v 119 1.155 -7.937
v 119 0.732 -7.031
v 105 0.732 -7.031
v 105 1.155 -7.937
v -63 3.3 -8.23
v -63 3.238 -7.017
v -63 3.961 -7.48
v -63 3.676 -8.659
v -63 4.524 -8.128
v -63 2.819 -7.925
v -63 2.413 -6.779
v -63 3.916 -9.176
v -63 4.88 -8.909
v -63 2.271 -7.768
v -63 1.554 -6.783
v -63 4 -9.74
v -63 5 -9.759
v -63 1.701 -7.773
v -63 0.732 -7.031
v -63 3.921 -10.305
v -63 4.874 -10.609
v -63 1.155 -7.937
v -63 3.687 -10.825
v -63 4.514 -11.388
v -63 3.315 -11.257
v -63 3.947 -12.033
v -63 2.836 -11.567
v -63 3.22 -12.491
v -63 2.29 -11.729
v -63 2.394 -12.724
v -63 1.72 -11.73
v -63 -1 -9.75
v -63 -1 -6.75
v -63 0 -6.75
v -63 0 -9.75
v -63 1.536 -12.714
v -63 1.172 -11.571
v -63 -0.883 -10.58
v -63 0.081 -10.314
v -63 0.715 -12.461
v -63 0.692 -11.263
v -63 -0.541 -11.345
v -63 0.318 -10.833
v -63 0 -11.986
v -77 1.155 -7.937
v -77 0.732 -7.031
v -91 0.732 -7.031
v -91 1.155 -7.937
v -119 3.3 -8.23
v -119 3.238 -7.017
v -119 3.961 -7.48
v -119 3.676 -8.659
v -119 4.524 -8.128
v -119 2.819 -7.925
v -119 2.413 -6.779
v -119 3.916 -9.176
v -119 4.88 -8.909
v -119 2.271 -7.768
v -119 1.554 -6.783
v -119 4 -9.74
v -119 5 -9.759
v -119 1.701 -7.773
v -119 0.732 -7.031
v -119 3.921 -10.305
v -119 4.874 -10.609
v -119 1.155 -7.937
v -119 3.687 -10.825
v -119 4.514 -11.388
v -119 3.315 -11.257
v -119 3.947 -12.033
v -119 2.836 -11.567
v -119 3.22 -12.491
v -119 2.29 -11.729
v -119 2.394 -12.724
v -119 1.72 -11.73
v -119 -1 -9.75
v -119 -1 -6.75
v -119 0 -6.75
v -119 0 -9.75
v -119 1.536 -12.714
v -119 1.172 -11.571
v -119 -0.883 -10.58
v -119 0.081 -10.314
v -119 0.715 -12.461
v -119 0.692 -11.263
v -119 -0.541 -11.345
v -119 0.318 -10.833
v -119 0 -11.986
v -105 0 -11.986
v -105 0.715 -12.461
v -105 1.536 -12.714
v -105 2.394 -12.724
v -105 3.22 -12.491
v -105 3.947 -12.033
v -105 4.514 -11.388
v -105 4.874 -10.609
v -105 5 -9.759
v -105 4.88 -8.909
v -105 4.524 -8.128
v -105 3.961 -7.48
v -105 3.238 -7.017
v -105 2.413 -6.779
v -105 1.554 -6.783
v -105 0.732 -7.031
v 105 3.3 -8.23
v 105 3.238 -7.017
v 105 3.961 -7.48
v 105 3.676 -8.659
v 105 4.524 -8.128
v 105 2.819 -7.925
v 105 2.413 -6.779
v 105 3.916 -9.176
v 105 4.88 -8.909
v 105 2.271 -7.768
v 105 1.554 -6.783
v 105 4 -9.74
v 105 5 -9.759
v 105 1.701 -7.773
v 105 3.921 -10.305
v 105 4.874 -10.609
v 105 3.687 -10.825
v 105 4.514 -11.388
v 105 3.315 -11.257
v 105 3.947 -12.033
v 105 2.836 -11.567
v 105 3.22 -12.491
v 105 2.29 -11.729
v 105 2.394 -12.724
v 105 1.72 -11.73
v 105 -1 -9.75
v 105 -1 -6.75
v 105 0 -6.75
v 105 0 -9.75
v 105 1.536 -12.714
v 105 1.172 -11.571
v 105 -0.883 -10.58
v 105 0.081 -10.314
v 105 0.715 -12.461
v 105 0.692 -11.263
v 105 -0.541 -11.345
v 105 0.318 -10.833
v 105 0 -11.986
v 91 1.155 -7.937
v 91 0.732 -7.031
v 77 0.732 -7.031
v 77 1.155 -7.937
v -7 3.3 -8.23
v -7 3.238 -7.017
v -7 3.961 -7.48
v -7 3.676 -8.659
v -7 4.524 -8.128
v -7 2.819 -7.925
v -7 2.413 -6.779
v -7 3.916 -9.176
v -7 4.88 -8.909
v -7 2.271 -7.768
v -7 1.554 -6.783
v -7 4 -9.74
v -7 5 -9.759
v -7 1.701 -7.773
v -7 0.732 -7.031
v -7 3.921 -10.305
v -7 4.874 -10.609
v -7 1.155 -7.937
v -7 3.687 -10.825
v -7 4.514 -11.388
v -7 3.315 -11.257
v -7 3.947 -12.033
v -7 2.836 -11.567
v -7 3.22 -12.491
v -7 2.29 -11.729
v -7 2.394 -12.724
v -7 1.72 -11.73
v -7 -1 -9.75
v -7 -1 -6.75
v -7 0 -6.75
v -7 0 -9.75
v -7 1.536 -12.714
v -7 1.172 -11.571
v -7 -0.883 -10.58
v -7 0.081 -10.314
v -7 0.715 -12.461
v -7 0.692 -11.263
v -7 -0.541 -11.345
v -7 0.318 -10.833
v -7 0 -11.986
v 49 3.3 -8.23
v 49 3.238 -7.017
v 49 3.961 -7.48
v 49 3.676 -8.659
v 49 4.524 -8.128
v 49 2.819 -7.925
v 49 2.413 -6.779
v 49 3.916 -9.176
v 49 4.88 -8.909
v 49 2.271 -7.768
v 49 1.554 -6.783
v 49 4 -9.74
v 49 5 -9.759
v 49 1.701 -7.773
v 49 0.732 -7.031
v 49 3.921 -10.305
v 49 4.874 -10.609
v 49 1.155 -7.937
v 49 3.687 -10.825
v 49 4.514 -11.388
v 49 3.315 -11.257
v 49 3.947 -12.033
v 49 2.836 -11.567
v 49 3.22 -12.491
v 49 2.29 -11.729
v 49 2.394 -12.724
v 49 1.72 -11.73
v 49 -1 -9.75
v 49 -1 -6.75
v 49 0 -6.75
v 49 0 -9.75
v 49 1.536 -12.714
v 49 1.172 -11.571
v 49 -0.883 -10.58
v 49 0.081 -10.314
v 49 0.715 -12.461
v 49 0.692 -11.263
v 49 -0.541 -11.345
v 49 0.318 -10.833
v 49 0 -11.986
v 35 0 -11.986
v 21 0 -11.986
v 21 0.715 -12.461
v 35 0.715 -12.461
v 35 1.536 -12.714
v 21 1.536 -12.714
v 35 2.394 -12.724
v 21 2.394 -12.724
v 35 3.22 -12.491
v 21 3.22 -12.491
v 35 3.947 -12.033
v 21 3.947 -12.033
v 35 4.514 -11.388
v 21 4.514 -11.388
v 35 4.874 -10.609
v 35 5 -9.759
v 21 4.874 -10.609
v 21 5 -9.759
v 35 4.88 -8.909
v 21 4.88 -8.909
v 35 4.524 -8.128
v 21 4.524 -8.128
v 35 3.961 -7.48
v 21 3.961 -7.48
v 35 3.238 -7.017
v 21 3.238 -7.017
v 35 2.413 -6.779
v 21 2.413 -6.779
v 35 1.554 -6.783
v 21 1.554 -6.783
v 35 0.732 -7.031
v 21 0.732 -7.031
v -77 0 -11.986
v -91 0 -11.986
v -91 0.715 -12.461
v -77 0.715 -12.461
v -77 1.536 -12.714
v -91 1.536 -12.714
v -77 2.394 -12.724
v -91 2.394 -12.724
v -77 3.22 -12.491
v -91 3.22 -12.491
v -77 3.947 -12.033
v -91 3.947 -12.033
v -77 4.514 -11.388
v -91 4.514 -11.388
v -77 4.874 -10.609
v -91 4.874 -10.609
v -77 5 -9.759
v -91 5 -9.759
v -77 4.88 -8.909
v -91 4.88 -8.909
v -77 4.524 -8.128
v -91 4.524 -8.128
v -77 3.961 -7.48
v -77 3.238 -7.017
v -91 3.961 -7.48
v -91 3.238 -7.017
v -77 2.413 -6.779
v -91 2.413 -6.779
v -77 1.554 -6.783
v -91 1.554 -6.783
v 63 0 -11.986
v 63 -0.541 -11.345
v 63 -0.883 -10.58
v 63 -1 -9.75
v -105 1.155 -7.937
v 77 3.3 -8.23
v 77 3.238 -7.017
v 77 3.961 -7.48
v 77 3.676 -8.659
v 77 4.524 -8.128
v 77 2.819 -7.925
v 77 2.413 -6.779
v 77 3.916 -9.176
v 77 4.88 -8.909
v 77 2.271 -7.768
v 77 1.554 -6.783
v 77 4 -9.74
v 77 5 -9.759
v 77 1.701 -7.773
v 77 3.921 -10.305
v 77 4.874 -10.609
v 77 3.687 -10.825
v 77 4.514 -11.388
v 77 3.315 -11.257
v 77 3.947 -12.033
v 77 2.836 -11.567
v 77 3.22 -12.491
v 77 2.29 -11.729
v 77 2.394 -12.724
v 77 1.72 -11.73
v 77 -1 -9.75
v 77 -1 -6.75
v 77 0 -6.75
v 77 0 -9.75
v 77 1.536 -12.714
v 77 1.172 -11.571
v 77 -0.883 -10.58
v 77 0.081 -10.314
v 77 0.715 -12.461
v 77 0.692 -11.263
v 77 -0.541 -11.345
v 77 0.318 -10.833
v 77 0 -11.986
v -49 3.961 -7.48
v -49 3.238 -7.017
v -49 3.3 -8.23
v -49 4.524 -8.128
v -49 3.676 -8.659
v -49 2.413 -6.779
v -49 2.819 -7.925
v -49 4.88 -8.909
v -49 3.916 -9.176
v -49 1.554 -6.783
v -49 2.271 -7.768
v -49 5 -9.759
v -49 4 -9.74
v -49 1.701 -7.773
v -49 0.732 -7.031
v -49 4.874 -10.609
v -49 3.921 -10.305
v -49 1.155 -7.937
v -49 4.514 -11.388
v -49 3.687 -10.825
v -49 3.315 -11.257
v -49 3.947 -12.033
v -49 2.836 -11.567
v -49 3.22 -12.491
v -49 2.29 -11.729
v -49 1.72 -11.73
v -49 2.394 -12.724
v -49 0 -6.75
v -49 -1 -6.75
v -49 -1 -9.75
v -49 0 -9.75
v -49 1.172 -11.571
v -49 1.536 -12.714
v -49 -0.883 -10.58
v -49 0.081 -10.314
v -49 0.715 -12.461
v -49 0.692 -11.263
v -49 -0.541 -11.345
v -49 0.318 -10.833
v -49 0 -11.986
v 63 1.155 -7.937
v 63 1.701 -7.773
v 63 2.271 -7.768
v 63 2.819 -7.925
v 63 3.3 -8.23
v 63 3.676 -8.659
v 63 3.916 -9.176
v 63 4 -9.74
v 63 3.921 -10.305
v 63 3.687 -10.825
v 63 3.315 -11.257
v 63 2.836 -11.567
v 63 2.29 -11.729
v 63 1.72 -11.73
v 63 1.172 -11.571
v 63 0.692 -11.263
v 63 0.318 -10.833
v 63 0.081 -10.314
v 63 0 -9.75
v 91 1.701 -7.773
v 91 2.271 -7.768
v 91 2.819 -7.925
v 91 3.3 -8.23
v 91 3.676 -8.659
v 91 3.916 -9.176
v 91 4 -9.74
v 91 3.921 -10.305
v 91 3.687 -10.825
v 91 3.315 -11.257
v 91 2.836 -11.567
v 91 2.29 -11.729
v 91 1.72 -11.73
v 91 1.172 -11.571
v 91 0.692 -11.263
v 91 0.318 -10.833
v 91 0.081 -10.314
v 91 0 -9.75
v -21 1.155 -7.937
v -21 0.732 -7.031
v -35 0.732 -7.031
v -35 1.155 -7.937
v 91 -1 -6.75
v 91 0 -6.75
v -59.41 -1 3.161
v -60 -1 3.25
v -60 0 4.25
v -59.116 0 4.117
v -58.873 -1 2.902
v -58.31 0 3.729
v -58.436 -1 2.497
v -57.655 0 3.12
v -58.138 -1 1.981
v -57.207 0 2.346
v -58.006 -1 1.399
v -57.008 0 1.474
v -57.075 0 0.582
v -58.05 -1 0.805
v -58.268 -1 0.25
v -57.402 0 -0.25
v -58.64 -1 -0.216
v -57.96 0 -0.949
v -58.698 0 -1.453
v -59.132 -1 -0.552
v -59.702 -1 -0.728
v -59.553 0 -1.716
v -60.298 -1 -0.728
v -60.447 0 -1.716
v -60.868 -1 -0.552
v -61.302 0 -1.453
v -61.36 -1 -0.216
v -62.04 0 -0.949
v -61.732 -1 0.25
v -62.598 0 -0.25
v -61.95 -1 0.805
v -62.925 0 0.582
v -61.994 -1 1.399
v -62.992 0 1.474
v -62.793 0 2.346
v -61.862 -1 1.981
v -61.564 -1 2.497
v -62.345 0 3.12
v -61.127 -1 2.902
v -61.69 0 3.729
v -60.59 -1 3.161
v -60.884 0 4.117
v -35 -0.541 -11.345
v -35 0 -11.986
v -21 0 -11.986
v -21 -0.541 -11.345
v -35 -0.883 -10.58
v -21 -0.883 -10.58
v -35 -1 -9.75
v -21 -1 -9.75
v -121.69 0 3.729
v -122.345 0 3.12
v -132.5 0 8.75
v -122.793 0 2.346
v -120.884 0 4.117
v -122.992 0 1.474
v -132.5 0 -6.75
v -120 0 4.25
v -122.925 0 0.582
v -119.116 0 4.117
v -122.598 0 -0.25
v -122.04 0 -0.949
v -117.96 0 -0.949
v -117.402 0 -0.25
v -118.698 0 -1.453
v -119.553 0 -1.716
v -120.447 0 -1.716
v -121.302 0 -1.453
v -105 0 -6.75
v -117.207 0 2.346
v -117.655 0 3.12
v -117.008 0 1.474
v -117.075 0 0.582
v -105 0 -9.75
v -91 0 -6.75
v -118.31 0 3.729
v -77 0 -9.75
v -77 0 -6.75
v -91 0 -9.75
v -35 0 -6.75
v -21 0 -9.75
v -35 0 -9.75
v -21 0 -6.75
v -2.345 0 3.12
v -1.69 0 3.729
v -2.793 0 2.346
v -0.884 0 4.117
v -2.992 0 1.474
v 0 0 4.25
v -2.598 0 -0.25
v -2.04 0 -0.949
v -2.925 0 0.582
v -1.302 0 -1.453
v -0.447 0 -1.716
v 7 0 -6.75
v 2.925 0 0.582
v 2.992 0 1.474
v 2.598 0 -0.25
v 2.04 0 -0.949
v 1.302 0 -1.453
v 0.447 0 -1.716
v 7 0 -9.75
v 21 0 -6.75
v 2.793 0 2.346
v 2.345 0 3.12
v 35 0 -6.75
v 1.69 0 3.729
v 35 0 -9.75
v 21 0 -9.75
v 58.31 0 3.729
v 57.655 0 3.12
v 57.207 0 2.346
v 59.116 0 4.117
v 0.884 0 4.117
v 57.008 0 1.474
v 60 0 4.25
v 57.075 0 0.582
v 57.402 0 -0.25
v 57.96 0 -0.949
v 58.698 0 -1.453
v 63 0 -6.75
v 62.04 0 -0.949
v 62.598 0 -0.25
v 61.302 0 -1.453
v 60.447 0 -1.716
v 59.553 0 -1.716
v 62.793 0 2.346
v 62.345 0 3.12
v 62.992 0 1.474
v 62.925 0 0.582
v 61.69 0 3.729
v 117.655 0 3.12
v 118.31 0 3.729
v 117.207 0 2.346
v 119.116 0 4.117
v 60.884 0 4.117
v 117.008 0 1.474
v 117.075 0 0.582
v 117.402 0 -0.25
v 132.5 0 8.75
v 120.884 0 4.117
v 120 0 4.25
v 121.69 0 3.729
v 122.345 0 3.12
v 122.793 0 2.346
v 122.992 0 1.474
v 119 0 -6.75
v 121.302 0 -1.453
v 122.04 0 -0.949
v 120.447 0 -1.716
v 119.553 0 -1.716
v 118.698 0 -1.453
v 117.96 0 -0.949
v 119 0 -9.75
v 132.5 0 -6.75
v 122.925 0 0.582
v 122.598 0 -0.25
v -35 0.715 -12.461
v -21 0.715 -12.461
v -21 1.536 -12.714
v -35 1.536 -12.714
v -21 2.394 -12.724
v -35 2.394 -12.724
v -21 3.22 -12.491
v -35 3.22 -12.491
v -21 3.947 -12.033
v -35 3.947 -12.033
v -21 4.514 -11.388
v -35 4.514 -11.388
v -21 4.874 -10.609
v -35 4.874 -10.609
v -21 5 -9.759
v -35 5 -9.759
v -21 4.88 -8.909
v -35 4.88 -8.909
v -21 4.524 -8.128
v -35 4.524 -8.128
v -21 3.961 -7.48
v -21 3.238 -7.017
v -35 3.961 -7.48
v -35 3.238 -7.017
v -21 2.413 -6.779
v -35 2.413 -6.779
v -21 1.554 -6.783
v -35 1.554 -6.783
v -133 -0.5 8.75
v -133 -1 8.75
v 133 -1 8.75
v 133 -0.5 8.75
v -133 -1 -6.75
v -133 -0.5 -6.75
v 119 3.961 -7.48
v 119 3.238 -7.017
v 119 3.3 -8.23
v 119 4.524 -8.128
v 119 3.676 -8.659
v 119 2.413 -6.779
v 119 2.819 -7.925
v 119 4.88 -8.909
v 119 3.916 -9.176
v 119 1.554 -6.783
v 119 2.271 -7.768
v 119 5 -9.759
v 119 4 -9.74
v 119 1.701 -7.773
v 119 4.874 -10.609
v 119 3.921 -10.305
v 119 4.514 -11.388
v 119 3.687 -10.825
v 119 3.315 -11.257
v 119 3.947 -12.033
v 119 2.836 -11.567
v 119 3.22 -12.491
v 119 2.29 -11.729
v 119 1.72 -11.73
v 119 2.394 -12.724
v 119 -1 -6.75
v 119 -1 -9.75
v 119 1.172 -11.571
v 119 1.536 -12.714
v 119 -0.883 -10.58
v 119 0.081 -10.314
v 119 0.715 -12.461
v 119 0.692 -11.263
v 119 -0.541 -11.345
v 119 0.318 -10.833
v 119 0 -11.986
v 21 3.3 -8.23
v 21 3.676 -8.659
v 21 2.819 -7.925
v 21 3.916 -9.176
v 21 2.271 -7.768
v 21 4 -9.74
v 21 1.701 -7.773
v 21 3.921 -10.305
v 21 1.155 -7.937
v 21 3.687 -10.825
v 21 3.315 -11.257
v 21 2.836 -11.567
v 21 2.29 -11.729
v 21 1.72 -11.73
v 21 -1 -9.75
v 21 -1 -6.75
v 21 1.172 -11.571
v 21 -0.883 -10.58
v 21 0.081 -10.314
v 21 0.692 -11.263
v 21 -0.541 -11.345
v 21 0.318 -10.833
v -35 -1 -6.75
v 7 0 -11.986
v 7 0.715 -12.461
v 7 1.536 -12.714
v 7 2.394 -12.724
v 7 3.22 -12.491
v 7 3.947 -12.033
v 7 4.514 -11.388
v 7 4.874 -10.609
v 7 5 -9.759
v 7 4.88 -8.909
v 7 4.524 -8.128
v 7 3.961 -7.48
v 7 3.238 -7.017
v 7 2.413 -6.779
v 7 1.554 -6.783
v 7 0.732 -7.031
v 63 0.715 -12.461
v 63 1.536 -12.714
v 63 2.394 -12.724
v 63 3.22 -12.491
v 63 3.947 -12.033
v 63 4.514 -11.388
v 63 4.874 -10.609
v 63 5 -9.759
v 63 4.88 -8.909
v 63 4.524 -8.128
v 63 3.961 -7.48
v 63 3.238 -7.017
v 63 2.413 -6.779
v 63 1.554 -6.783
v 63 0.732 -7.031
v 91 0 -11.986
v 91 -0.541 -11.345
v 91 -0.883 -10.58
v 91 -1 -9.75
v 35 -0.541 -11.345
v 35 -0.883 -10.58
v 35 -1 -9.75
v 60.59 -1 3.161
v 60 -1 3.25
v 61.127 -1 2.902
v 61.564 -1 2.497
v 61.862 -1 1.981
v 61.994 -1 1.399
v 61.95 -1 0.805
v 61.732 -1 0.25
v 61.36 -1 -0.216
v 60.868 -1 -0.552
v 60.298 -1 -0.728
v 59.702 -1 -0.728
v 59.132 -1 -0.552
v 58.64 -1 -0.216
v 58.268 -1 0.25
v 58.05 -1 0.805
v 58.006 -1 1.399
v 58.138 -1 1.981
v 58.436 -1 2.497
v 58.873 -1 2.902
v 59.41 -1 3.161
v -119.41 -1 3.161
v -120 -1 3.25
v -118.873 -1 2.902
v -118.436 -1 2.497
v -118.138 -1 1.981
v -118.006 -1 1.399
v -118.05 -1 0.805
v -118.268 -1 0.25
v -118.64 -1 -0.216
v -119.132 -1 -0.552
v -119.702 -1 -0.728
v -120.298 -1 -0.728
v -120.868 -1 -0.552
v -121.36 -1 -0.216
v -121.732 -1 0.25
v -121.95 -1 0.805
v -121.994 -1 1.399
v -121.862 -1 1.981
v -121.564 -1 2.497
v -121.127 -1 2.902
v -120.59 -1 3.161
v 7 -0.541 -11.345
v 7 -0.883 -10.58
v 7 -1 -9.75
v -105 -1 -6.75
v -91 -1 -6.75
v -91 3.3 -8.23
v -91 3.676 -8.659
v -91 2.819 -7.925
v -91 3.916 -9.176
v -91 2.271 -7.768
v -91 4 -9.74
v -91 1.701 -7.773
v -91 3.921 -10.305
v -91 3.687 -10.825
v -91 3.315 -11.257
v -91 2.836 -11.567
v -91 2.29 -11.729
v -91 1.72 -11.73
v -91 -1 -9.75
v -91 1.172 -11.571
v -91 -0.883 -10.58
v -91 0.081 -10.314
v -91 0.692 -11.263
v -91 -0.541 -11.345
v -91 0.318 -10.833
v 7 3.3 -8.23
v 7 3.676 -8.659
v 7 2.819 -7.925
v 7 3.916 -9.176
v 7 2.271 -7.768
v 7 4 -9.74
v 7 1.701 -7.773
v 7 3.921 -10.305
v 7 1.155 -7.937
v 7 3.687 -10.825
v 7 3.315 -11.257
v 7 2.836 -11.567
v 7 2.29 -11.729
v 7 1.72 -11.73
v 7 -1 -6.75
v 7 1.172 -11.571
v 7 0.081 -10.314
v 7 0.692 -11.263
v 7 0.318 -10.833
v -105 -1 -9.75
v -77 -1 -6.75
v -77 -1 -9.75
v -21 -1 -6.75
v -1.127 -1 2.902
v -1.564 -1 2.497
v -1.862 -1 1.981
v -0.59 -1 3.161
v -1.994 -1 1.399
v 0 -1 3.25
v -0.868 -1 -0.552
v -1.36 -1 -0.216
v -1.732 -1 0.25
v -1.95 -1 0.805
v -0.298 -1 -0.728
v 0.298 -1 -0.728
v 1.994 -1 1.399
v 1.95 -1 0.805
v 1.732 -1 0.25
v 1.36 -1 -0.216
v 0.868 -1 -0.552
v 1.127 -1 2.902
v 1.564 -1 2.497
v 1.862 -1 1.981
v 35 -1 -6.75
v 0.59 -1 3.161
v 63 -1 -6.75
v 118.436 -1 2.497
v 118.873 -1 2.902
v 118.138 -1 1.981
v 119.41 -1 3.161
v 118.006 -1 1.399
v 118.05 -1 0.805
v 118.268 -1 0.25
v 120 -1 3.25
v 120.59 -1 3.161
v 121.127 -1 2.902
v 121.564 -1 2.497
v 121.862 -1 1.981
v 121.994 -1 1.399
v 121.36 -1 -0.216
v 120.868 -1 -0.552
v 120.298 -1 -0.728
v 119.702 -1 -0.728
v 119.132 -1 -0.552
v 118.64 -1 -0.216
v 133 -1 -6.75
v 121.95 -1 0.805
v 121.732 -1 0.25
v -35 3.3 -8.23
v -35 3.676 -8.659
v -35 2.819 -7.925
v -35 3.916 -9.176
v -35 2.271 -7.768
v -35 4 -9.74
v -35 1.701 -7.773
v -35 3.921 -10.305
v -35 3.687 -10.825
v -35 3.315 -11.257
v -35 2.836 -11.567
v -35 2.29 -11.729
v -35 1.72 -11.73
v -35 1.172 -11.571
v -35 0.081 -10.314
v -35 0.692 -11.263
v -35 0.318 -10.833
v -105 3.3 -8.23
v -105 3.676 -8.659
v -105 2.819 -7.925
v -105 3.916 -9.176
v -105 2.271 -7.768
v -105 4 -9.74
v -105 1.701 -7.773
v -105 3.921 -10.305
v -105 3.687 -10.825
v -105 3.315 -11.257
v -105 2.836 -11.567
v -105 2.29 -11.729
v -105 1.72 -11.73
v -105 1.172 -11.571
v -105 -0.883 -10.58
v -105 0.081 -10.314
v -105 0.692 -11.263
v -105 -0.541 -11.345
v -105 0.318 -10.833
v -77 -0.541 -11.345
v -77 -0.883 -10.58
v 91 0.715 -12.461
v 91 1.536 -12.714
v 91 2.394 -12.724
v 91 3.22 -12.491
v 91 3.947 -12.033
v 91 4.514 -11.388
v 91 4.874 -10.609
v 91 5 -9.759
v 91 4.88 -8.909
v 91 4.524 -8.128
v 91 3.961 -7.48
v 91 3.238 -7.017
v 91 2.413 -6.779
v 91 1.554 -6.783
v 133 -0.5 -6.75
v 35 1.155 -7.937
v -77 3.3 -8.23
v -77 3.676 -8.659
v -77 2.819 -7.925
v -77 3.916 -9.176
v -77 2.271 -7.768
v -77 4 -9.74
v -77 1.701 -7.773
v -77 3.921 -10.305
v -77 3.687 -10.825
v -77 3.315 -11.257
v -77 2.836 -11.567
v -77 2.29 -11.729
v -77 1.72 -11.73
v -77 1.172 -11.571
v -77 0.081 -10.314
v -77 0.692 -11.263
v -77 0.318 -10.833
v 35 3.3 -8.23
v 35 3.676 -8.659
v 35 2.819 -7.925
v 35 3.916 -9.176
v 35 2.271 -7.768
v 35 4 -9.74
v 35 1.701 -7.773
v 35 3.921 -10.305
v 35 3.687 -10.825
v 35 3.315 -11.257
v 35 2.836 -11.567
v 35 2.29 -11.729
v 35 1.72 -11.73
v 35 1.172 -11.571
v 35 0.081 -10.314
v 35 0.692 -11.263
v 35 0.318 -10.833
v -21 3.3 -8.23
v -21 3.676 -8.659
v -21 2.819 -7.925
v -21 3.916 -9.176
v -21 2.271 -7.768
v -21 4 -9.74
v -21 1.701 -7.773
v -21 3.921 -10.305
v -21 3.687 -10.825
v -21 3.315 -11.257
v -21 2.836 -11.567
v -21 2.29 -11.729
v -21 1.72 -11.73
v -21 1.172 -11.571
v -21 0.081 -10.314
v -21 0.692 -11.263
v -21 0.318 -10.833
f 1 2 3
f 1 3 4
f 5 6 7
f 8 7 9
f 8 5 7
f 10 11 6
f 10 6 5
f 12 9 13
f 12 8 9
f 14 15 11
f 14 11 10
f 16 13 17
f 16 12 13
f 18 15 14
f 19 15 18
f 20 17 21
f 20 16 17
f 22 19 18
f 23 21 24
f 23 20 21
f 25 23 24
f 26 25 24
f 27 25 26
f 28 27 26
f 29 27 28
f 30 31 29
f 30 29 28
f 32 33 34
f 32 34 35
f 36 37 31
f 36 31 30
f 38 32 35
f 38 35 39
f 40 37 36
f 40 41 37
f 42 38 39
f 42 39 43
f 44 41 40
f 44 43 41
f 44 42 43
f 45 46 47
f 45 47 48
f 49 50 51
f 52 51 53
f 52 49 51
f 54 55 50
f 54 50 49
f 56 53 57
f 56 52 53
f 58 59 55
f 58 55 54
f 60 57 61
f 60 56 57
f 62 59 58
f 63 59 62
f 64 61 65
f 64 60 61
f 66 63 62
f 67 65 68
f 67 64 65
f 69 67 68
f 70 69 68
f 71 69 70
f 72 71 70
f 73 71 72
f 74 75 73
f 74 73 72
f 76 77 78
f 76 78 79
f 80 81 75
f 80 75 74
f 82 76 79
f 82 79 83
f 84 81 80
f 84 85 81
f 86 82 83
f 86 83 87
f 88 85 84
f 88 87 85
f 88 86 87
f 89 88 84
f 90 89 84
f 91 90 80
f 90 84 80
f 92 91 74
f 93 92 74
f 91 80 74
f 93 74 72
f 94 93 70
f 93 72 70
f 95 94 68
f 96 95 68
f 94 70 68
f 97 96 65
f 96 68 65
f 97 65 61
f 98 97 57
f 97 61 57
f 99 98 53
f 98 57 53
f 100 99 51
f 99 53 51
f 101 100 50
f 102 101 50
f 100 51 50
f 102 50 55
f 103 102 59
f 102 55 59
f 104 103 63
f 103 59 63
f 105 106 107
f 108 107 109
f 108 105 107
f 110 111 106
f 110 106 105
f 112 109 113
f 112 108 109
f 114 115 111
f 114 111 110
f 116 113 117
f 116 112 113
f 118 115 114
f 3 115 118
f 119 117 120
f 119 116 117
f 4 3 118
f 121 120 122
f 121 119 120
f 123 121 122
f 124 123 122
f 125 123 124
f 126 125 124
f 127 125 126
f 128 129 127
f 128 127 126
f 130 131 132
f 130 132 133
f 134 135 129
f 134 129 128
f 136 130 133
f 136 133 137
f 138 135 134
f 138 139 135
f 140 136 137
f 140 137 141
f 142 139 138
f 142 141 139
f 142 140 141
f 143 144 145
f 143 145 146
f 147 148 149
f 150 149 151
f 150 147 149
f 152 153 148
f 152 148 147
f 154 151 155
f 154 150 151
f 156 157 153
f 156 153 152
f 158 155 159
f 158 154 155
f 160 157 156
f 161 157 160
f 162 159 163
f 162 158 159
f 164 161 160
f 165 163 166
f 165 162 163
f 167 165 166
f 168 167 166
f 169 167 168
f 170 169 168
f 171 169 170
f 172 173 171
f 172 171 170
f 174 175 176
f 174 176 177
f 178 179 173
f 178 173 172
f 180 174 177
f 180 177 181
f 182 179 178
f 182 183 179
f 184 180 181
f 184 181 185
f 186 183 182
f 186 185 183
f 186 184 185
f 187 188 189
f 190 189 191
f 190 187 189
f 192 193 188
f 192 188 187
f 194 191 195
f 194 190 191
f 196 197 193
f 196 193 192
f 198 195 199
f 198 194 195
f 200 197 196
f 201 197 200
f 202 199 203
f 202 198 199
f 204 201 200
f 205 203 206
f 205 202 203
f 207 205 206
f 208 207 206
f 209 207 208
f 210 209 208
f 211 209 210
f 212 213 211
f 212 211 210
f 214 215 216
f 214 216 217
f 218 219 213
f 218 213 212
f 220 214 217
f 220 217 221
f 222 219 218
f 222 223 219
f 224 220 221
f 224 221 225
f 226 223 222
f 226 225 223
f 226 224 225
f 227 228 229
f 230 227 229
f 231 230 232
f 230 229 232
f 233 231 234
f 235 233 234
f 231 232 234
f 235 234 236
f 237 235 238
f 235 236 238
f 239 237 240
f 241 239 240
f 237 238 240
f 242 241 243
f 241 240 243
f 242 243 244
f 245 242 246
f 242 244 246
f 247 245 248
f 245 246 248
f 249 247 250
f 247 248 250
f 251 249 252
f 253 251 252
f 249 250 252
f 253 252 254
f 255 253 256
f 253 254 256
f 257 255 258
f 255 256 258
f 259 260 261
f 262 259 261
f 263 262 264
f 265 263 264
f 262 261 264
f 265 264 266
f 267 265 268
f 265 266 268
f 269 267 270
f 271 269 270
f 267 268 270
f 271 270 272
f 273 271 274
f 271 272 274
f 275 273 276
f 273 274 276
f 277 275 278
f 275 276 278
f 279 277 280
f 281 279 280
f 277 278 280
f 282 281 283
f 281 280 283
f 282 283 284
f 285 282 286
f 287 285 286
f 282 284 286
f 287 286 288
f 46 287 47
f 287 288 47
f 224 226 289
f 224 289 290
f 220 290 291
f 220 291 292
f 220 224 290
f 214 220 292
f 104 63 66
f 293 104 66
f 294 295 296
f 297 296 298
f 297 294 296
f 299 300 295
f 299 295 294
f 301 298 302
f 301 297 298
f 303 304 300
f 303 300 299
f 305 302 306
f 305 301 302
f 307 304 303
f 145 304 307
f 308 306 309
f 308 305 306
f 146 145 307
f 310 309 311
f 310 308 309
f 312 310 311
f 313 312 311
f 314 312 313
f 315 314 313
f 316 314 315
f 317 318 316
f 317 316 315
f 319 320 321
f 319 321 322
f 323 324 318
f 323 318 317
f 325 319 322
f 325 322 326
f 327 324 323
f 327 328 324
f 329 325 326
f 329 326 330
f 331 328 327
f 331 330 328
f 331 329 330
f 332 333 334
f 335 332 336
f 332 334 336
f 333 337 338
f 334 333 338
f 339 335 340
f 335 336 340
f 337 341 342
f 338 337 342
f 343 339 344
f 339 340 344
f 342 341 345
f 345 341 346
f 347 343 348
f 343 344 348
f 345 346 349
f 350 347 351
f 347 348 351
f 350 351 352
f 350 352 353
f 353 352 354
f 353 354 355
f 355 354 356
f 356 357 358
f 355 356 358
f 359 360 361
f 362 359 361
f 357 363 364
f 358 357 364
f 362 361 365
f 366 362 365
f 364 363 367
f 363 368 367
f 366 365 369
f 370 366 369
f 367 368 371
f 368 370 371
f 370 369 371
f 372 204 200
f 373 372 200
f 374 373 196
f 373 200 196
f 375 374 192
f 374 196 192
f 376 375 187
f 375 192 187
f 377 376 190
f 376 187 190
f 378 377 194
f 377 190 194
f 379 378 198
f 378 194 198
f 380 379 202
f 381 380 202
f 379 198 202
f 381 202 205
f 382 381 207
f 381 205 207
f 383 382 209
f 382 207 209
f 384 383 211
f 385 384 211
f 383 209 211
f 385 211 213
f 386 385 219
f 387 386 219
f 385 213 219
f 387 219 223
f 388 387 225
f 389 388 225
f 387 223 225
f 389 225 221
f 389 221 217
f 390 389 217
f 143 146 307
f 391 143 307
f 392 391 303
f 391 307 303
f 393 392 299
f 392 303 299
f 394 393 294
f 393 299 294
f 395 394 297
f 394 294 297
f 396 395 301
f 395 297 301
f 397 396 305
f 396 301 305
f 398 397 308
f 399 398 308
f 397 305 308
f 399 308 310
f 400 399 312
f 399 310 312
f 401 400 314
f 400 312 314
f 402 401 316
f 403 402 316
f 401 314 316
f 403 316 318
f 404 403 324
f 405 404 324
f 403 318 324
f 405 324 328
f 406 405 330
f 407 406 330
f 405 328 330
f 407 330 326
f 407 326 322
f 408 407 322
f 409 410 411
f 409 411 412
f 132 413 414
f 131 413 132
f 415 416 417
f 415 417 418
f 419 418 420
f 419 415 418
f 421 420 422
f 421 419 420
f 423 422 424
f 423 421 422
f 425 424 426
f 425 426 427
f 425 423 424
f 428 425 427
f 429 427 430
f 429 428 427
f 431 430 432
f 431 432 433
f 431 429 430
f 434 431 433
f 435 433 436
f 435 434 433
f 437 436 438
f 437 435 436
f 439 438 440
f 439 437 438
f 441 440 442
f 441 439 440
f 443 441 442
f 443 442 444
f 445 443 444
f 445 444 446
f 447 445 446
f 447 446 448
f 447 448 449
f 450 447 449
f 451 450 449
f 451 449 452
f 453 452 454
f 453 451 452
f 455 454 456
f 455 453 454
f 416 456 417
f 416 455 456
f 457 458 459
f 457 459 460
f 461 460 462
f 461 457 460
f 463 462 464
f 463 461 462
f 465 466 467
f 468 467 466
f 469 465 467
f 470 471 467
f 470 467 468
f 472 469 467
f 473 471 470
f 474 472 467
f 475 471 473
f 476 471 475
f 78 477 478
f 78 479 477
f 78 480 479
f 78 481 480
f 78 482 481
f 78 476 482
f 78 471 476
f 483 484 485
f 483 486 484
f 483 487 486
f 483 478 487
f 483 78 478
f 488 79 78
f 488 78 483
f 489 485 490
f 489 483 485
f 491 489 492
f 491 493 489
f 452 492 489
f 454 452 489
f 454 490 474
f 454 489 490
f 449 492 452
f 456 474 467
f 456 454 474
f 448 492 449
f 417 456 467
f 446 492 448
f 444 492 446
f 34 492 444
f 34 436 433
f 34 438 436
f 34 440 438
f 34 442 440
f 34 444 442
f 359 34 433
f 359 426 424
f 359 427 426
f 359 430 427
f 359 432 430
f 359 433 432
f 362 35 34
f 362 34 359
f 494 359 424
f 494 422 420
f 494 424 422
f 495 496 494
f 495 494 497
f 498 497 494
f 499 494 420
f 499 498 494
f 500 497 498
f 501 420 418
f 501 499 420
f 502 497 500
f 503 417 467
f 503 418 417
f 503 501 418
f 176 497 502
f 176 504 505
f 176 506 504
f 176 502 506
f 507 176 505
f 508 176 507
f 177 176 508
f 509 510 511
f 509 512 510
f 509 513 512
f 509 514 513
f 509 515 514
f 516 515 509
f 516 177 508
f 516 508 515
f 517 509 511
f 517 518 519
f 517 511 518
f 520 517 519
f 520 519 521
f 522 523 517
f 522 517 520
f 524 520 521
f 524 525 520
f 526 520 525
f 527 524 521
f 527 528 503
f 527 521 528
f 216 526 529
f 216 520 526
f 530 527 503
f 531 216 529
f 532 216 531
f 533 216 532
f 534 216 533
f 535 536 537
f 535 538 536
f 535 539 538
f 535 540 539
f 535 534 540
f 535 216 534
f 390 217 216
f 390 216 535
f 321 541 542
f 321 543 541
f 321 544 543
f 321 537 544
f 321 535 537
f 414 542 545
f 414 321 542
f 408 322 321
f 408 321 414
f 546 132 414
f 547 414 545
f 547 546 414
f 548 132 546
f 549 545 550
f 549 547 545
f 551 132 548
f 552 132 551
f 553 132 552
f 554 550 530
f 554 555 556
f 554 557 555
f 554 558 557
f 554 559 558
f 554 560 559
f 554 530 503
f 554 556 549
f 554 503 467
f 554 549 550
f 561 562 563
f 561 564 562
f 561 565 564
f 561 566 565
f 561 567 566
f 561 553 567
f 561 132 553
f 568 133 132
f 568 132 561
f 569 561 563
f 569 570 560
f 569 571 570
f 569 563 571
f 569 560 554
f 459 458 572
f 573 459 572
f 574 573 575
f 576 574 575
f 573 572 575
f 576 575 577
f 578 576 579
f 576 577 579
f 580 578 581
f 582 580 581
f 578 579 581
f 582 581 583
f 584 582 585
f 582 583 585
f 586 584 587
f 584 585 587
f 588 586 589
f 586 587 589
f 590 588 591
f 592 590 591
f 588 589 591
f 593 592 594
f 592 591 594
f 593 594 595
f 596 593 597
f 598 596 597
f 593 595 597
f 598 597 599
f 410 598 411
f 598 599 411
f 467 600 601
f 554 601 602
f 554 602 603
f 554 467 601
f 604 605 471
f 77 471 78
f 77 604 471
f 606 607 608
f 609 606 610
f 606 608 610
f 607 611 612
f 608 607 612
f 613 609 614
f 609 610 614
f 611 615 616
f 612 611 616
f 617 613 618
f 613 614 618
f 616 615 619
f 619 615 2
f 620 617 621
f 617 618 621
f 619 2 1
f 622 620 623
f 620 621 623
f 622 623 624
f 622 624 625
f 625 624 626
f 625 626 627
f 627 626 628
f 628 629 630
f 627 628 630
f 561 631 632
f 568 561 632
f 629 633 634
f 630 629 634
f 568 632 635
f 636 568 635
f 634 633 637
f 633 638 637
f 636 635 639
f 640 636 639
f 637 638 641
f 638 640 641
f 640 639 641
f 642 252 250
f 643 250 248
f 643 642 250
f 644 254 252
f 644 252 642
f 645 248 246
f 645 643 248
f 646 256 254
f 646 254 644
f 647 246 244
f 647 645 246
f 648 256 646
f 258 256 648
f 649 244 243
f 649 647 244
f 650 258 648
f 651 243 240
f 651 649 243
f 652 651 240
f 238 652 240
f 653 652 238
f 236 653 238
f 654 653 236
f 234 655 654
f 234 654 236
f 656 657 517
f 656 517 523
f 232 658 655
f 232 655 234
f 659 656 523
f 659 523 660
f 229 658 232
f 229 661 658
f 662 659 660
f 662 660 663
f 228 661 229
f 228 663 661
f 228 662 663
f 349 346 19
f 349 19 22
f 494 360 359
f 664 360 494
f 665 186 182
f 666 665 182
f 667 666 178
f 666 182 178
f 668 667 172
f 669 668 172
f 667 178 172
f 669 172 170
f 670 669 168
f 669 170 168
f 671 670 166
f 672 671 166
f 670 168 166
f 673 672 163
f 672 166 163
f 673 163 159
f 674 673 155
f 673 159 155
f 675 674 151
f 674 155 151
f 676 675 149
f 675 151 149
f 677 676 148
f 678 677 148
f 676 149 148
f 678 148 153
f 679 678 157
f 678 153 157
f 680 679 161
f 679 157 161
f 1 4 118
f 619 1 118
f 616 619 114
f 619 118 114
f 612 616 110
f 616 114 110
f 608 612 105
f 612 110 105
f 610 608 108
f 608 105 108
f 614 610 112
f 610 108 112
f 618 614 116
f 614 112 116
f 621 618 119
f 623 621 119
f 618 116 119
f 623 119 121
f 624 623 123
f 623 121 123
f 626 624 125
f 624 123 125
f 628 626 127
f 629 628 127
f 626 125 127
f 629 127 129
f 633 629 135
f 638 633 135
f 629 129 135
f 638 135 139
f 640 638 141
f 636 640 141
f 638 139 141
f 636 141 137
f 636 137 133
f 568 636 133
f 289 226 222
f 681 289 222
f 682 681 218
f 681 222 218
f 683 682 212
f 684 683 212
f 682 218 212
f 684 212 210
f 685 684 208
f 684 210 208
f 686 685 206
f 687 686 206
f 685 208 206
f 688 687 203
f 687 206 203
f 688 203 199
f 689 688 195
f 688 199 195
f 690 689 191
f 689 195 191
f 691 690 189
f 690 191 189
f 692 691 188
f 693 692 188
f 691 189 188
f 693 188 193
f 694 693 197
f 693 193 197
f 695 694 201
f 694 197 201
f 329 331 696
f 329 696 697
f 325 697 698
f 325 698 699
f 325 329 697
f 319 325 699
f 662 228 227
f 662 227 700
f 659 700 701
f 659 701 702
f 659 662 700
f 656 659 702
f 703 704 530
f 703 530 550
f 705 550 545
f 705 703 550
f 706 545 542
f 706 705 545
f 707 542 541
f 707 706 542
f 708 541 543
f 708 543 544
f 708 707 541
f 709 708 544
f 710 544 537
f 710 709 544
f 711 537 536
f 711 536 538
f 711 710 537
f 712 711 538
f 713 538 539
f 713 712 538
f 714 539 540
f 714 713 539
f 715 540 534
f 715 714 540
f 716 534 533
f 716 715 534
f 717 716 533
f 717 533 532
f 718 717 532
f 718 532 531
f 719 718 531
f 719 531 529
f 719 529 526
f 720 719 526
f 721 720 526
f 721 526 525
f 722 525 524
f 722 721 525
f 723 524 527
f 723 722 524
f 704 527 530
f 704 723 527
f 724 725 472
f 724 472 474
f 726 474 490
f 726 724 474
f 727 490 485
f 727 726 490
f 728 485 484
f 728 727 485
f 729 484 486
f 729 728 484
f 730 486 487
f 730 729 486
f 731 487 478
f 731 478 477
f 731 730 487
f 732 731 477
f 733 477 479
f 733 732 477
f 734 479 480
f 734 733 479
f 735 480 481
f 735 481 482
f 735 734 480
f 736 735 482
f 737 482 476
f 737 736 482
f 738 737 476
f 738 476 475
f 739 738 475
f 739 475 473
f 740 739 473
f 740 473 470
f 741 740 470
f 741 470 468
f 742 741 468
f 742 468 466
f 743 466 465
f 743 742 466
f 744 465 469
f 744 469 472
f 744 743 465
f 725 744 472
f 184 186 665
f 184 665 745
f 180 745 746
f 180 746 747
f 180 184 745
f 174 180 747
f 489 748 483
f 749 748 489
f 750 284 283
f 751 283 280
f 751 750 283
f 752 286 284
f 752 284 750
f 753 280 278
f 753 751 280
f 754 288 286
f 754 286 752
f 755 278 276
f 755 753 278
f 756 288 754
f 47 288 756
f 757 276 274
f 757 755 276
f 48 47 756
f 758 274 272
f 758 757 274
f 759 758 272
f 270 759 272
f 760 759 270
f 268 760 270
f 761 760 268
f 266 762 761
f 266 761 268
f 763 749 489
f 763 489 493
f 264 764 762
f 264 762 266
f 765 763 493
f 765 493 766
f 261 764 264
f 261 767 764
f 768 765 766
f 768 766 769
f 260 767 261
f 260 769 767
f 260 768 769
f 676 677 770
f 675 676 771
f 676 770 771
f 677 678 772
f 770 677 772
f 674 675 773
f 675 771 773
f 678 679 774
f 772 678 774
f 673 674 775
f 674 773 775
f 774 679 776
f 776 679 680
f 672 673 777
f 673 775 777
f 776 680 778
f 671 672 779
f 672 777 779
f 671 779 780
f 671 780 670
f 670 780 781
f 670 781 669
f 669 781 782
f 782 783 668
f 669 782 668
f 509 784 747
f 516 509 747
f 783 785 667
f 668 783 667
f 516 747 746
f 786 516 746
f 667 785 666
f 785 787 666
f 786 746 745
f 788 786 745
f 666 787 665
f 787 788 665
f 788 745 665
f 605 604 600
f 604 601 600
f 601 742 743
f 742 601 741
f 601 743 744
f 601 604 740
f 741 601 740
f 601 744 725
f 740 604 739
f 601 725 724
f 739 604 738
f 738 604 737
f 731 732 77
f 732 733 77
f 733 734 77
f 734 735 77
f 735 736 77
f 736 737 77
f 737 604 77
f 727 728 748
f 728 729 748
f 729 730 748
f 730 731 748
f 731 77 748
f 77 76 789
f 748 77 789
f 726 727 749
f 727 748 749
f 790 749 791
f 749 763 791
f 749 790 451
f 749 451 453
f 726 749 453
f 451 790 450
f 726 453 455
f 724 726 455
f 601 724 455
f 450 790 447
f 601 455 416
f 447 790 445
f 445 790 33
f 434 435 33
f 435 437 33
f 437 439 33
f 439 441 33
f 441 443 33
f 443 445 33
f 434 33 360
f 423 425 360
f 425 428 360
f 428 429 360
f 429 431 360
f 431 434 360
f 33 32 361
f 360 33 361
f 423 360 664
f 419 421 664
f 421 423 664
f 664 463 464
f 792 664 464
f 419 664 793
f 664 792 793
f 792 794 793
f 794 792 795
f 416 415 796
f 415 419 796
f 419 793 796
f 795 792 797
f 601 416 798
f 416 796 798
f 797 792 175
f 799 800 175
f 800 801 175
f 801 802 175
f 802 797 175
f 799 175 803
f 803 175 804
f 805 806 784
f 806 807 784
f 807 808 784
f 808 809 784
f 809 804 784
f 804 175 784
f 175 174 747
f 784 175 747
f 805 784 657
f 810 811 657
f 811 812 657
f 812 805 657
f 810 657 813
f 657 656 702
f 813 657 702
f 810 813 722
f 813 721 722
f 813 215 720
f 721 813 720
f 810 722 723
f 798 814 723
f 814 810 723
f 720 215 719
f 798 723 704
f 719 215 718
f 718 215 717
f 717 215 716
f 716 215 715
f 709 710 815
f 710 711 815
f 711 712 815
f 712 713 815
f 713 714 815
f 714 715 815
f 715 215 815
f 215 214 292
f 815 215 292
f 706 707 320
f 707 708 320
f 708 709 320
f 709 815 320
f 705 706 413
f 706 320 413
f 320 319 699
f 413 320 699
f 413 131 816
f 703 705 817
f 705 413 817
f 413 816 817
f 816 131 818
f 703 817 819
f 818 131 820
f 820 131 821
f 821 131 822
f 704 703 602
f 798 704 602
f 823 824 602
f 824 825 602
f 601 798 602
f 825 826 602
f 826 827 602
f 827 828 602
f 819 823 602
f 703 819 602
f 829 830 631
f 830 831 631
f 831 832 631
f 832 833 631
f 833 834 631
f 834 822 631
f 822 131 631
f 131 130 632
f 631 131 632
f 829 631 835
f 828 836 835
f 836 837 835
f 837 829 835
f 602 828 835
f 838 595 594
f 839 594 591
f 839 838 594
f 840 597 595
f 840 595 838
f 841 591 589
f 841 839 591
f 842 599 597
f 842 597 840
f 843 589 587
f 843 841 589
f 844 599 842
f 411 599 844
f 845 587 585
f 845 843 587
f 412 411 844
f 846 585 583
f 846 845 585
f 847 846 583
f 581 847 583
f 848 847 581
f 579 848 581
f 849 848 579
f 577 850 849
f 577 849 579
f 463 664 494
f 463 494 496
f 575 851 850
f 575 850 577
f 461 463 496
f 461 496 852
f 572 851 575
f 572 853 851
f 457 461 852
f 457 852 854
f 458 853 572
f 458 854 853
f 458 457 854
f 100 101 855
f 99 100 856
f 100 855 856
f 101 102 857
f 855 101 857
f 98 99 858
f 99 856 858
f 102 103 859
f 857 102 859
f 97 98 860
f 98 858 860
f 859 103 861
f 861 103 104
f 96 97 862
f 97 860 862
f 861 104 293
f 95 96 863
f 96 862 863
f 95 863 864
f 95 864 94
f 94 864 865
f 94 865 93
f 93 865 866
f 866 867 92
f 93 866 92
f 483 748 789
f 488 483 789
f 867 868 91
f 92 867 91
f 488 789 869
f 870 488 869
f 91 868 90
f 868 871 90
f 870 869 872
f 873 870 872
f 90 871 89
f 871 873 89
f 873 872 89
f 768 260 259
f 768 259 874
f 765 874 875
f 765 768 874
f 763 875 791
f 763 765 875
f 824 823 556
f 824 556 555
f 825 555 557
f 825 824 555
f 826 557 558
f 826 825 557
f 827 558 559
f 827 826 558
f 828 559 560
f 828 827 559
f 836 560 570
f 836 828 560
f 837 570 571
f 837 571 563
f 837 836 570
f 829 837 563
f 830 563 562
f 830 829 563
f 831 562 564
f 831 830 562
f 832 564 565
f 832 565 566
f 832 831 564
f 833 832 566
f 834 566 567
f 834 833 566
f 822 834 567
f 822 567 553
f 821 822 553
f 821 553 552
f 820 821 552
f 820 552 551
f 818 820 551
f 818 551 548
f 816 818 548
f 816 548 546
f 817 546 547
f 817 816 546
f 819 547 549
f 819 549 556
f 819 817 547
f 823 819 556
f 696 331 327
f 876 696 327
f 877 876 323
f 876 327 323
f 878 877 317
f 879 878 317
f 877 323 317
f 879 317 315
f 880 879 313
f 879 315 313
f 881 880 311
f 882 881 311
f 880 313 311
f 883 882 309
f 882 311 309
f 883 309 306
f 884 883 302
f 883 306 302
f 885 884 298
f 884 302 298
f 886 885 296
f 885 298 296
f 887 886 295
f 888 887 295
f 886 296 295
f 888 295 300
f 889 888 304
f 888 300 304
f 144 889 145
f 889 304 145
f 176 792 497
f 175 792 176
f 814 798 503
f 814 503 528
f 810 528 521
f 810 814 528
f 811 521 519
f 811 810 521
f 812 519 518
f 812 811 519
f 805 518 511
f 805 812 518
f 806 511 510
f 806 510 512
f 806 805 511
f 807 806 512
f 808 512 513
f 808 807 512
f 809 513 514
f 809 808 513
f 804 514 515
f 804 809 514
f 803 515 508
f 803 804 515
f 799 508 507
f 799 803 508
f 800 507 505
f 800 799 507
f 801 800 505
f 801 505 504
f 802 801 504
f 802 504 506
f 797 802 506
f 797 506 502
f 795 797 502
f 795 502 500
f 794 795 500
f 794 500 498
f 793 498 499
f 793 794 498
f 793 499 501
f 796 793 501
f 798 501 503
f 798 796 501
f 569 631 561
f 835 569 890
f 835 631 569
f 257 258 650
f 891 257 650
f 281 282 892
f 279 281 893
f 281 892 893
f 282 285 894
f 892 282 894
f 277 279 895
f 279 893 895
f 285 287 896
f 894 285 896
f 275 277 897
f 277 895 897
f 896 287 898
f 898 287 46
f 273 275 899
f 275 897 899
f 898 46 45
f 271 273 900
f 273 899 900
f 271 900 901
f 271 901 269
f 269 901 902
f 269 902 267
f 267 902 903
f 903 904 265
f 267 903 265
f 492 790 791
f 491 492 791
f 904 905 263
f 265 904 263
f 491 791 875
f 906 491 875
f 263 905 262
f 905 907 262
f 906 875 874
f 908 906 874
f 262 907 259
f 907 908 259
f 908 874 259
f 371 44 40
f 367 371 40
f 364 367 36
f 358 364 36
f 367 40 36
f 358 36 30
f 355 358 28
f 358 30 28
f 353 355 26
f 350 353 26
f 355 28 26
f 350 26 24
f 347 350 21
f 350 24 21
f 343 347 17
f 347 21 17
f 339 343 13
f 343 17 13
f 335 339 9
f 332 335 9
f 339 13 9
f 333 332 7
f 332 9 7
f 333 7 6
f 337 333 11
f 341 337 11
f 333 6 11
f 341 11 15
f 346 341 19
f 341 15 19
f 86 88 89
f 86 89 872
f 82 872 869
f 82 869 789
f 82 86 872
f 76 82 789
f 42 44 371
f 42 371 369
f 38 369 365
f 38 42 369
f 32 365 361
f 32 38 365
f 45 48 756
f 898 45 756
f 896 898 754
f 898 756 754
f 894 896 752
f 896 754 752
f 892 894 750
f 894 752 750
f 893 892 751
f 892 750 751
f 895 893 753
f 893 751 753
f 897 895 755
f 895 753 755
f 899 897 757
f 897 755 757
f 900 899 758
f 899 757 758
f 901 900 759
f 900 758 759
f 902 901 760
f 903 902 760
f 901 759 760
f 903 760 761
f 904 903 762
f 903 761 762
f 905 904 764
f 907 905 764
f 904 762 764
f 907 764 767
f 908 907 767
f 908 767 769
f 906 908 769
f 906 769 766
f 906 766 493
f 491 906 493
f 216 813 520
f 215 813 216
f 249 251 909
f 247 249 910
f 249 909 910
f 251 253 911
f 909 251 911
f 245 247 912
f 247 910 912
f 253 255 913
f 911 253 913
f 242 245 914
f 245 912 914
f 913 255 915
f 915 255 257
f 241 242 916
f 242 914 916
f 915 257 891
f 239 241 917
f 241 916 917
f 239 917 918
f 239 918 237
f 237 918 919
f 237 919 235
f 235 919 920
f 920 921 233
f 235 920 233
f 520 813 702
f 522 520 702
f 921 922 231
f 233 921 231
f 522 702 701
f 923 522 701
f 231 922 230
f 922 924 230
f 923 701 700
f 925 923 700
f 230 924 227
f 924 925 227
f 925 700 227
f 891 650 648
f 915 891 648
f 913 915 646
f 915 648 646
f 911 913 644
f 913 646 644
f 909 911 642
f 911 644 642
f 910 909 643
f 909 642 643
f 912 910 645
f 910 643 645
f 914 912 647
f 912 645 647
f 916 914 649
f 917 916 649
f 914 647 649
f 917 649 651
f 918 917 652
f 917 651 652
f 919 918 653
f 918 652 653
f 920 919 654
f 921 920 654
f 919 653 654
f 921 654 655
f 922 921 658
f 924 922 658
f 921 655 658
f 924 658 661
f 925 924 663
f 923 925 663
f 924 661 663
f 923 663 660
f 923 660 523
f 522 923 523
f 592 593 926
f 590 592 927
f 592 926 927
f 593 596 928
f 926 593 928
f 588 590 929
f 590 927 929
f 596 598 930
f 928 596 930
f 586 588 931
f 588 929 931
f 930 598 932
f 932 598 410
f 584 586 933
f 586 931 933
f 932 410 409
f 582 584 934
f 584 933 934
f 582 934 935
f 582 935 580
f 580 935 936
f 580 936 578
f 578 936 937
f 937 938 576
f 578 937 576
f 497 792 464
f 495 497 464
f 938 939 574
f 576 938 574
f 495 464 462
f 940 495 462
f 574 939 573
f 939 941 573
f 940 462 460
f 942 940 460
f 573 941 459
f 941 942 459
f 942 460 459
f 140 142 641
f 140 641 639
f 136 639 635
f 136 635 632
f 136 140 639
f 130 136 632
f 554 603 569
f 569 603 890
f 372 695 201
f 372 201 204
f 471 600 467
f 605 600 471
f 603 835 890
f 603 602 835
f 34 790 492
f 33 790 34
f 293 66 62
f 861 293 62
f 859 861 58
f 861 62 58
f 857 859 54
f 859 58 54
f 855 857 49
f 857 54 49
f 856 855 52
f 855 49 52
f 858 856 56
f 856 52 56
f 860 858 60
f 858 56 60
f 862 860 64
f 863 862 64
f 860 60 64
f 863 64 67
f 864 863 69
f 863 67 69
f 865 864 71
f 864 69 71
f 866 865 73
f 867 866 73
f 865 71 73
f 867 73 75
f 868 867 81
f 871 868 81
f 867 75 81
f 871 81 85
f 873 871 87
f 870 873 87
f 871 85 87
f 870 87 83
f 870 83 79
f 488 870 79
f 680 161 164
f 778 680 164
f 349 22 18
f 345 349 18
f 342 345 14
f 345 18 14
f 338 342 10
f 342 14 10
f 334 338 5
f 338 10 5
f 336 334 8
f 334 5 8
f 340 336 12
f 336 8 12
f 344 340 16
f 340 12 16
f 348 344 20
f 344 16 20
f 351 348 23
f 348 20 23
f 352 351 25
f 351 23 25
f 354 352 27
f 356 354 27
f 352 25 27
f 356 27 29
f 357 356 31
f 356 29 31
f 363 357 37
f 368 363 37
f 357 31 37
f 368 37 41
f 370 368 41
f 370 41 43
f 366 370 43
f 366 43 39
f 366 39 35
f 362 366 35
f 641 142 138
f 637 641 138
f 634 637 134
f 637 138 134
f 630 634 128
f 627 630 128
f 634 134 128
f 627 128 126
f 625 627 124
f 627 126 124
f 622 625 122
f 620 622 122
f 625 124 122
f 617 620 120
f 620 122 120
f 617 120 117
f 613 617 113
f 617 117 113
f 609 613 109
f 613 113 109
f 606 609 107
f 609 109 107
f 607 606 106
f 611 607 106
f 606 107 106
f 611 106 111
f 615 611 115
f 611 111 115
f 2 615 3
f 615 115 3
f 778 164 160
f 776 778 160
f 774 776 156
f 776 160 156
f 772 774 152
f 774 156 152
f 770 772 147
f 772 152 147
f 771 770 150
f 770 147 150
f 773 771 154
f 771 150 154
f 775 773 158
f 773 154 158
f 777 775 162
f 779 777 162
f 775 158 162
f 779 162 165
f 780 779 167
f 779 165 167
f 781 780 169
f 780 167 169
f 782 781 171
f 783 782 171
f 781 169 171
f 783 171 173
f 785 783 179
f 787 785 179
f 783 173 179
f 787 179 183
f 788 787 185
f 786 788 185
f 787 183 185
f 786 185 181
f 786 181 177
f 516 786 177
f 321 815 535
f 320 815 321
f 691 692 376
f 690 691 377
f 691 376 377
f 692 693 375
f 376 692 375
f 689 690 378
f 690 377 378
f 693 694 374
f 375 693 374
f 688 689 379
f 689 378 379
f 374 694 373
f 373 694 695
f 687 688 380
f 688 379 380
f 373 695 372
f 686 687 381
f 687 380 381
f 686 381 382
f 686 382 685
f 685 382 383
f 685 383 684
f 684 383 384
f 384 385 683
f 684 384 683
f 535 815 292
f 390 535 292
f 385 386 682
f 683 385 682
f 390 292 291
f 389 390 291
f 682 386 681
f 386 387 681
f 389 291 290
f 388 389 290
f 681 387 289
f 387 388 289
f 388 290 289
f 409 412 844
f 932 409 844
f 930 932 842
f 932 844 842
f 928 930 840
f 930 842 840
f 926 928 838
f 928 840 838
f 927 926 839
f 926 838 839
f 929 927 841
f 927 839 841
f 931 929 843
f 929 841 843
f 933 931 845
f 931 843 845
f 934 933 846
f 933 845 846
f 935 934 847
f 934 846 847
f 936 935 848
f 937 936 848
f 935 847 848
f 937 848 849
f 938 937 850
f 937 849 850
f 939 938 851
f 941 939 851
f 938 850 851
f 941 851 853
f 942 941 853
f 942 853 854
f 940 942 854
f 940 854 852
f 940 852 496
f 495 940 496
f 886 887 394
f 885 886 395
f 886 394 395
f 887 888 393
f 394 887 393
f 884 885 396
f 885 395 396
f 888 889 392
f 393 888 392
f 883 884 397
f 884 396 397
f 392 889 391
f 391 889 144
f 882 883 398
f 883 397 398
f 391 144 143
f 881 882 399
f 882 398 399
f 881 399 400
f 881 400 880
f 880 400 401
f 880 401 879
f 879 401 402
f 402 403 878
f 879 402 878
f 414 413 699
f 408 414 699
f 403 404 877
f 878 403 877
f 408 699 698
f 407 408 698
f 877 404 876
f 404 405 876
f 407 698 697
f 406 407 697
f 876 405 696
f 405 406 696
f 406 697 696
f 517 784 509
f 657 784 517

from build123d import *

# Parameters (mm, degrees)
SKETCH1_W          = 266
SKETCH1_H          = 25.5
BASE_FLANGE1_DEPTH = 1
HEM1_START         = -133
HEM1_DEPTH         = 266
HEM1_2_DEPTH       = 266
CUT_EXTRUDE1_START = -134.703262862
SKETCH8_W          = 14
SKETCH8_H          = 6
CUT_EXTRUDE1_DEPTH = 259.406525724
LPATTERN1_COUNT    = 11
LPATTERN1_PITCH    = 28
CHAMFER1_SIZE      = 0.5
SKETCH10_W         = 266
SKETCH10_H         = 4
CUT_EXTRUDE3_DEPTH = 10
SKETCH9_R          = 2
CUT_EXTRUDE2_DEPTH = 10
LPATTERN2_COUNT    = 5
LPATTERN2_PITCH    = 60
CHAMFER2_SIZE      = 1


# Read off the part's stored shape, not the designer's step: Hem1
# Sheet-metal steps are written as plain solids
with BuildPart() as part:
    # Sketch1 → Base-Flange1 (new body)
    with BuildSketch(Plane(origin=(0, 0, 0), x_dir=(1, 0, 0), z_dir=(0, 1, 0))):
        Rectangle(SKETCH1_W, SKETCH1_H)
    extrude(amount=-BASE_FLANGE1_DEPTH)

    # Hem1 outline → Hem1 (cut)
    with BuildSketch(Plane.YZ.offset(HEM1_START)):
        with BuildLine():
            Line((0, -12.75), (0, -11.986067977))
            ThreePointArc((0, -11.986067977), (-0.738612788, -10.974744871), (-1, -9.75))
            Line((-1, -9.75), (-1, -12.75))
            Line((-1, -12.75), (0, -12.75))
        make_face()
    extrude(amount=HEM1_DEPTH, mode=Mode.SUBTRACT)

    # Hem1 2 outline → Hem1 2 (add)
    with BuildSketch(Plane.YZ.offset(HEM1_START)):
        with BuildLine():
            Line((0.732145215, -7.031076639), (1.154763477, -7.937384426))
            ThreePointArc((1.154763477, -7.937384426), (3.686782892, -10.824599218), (0, -9.75))
            Line((0, -9.75), (0, -11.986067977))
            ThreePointArc((0, -11.986067977), (4.967777538, -10.18851623), (0.732145215, -7.031076639))
        make_face()
    extrude(amount=HEM1_2_DEPTH)

    # Sketch8 → Cut-Extrude1 (cut)
    with BuildSketch(Plane(origin=(0, 0, 0), x_dir=(1, 0, 0), z_dir=(0, 1, 0)).offset(CUT_EXTRUDE1_START)):
        with Locations((126, 9.75)):
            Rectangle(SKETCH8_W, SKETCH8_H)
    cut_extrude1 = extrude(amount=CUT_EXTRUDE1_DEPTH, mode=Mode.SUBTRACT)

    # LPattern1: Cut-Extrude1 ×11
    with Locations(*[(-i * LPATTERN1_PITCH, 0, 0) for i in range(1, LPATTERN1_COUNT)]):
        add(cut_extrude1, mode=Mode.SUBTRACT)

    # Chamfer1
    chamfer1_edges = [part.edges().sort_by_distance(p)[0] for p in [
        (-133, 0, 3),
        (0, 0, 12.75),
        (133, 0, 3),
    ]]
    chamfer(chamfer1_edges, length=CHAMFER1_SIZE)

    # Sketch10 → Cut-Extrude3 (cut)
    with BuildSketch(Plane(origin=(0, 0, 0), x_dir=(1, 0, 0), z_dir=(0, 1, 0))):
        with Locations((0, -10.75)):
            Rectangle(SKETCH10_W, SKETCH10_H)
    extrude(amount=-CUT_EXTRUDE3_DEPTH, mode=Mode.SUBTRACT)

    # Sketch9 → Cut-Extrude2 (cut)
    with BuildSketch(Plane(origin=(0, 0, 0), x_dir=(1, 0, 0), z_dir=(0, 1, 0))):
        with Locations(Location((-120, -1.25, 0), (0, 0, 270))):
            Circle(SKETCH9_R)
    cut_extrude2 = extrude(amount=-CUT_EXTRUDE2_DEPTH, mode=Mode.SUBTRACT)

    # LPattern2: Cut-Extrude2 ×5
    with Locations(*[(i * LPATTERN2_PITCH, 0, 0) for i in range(1, LPATTERN2_COUNT)]):
        add(cut_extrude2, mode=Mode.SUBTRACT)

    # Chamfer2
    chamfer2_edges = [part.edges().sort_by_distance(p)[0] for p in [
        (-120, 0, -0.75),
        (-60, 0, -0.75),
        (0, 0, -0.75),
        (60, 0, -0.75),
        (120, 0, -0.75),
    ]]
    chamfer(chamfer2_edges, length=CHAMFER2_SIZE - 0.0001)  # a hair under: the kernel refuses the full size


solid = part.part
